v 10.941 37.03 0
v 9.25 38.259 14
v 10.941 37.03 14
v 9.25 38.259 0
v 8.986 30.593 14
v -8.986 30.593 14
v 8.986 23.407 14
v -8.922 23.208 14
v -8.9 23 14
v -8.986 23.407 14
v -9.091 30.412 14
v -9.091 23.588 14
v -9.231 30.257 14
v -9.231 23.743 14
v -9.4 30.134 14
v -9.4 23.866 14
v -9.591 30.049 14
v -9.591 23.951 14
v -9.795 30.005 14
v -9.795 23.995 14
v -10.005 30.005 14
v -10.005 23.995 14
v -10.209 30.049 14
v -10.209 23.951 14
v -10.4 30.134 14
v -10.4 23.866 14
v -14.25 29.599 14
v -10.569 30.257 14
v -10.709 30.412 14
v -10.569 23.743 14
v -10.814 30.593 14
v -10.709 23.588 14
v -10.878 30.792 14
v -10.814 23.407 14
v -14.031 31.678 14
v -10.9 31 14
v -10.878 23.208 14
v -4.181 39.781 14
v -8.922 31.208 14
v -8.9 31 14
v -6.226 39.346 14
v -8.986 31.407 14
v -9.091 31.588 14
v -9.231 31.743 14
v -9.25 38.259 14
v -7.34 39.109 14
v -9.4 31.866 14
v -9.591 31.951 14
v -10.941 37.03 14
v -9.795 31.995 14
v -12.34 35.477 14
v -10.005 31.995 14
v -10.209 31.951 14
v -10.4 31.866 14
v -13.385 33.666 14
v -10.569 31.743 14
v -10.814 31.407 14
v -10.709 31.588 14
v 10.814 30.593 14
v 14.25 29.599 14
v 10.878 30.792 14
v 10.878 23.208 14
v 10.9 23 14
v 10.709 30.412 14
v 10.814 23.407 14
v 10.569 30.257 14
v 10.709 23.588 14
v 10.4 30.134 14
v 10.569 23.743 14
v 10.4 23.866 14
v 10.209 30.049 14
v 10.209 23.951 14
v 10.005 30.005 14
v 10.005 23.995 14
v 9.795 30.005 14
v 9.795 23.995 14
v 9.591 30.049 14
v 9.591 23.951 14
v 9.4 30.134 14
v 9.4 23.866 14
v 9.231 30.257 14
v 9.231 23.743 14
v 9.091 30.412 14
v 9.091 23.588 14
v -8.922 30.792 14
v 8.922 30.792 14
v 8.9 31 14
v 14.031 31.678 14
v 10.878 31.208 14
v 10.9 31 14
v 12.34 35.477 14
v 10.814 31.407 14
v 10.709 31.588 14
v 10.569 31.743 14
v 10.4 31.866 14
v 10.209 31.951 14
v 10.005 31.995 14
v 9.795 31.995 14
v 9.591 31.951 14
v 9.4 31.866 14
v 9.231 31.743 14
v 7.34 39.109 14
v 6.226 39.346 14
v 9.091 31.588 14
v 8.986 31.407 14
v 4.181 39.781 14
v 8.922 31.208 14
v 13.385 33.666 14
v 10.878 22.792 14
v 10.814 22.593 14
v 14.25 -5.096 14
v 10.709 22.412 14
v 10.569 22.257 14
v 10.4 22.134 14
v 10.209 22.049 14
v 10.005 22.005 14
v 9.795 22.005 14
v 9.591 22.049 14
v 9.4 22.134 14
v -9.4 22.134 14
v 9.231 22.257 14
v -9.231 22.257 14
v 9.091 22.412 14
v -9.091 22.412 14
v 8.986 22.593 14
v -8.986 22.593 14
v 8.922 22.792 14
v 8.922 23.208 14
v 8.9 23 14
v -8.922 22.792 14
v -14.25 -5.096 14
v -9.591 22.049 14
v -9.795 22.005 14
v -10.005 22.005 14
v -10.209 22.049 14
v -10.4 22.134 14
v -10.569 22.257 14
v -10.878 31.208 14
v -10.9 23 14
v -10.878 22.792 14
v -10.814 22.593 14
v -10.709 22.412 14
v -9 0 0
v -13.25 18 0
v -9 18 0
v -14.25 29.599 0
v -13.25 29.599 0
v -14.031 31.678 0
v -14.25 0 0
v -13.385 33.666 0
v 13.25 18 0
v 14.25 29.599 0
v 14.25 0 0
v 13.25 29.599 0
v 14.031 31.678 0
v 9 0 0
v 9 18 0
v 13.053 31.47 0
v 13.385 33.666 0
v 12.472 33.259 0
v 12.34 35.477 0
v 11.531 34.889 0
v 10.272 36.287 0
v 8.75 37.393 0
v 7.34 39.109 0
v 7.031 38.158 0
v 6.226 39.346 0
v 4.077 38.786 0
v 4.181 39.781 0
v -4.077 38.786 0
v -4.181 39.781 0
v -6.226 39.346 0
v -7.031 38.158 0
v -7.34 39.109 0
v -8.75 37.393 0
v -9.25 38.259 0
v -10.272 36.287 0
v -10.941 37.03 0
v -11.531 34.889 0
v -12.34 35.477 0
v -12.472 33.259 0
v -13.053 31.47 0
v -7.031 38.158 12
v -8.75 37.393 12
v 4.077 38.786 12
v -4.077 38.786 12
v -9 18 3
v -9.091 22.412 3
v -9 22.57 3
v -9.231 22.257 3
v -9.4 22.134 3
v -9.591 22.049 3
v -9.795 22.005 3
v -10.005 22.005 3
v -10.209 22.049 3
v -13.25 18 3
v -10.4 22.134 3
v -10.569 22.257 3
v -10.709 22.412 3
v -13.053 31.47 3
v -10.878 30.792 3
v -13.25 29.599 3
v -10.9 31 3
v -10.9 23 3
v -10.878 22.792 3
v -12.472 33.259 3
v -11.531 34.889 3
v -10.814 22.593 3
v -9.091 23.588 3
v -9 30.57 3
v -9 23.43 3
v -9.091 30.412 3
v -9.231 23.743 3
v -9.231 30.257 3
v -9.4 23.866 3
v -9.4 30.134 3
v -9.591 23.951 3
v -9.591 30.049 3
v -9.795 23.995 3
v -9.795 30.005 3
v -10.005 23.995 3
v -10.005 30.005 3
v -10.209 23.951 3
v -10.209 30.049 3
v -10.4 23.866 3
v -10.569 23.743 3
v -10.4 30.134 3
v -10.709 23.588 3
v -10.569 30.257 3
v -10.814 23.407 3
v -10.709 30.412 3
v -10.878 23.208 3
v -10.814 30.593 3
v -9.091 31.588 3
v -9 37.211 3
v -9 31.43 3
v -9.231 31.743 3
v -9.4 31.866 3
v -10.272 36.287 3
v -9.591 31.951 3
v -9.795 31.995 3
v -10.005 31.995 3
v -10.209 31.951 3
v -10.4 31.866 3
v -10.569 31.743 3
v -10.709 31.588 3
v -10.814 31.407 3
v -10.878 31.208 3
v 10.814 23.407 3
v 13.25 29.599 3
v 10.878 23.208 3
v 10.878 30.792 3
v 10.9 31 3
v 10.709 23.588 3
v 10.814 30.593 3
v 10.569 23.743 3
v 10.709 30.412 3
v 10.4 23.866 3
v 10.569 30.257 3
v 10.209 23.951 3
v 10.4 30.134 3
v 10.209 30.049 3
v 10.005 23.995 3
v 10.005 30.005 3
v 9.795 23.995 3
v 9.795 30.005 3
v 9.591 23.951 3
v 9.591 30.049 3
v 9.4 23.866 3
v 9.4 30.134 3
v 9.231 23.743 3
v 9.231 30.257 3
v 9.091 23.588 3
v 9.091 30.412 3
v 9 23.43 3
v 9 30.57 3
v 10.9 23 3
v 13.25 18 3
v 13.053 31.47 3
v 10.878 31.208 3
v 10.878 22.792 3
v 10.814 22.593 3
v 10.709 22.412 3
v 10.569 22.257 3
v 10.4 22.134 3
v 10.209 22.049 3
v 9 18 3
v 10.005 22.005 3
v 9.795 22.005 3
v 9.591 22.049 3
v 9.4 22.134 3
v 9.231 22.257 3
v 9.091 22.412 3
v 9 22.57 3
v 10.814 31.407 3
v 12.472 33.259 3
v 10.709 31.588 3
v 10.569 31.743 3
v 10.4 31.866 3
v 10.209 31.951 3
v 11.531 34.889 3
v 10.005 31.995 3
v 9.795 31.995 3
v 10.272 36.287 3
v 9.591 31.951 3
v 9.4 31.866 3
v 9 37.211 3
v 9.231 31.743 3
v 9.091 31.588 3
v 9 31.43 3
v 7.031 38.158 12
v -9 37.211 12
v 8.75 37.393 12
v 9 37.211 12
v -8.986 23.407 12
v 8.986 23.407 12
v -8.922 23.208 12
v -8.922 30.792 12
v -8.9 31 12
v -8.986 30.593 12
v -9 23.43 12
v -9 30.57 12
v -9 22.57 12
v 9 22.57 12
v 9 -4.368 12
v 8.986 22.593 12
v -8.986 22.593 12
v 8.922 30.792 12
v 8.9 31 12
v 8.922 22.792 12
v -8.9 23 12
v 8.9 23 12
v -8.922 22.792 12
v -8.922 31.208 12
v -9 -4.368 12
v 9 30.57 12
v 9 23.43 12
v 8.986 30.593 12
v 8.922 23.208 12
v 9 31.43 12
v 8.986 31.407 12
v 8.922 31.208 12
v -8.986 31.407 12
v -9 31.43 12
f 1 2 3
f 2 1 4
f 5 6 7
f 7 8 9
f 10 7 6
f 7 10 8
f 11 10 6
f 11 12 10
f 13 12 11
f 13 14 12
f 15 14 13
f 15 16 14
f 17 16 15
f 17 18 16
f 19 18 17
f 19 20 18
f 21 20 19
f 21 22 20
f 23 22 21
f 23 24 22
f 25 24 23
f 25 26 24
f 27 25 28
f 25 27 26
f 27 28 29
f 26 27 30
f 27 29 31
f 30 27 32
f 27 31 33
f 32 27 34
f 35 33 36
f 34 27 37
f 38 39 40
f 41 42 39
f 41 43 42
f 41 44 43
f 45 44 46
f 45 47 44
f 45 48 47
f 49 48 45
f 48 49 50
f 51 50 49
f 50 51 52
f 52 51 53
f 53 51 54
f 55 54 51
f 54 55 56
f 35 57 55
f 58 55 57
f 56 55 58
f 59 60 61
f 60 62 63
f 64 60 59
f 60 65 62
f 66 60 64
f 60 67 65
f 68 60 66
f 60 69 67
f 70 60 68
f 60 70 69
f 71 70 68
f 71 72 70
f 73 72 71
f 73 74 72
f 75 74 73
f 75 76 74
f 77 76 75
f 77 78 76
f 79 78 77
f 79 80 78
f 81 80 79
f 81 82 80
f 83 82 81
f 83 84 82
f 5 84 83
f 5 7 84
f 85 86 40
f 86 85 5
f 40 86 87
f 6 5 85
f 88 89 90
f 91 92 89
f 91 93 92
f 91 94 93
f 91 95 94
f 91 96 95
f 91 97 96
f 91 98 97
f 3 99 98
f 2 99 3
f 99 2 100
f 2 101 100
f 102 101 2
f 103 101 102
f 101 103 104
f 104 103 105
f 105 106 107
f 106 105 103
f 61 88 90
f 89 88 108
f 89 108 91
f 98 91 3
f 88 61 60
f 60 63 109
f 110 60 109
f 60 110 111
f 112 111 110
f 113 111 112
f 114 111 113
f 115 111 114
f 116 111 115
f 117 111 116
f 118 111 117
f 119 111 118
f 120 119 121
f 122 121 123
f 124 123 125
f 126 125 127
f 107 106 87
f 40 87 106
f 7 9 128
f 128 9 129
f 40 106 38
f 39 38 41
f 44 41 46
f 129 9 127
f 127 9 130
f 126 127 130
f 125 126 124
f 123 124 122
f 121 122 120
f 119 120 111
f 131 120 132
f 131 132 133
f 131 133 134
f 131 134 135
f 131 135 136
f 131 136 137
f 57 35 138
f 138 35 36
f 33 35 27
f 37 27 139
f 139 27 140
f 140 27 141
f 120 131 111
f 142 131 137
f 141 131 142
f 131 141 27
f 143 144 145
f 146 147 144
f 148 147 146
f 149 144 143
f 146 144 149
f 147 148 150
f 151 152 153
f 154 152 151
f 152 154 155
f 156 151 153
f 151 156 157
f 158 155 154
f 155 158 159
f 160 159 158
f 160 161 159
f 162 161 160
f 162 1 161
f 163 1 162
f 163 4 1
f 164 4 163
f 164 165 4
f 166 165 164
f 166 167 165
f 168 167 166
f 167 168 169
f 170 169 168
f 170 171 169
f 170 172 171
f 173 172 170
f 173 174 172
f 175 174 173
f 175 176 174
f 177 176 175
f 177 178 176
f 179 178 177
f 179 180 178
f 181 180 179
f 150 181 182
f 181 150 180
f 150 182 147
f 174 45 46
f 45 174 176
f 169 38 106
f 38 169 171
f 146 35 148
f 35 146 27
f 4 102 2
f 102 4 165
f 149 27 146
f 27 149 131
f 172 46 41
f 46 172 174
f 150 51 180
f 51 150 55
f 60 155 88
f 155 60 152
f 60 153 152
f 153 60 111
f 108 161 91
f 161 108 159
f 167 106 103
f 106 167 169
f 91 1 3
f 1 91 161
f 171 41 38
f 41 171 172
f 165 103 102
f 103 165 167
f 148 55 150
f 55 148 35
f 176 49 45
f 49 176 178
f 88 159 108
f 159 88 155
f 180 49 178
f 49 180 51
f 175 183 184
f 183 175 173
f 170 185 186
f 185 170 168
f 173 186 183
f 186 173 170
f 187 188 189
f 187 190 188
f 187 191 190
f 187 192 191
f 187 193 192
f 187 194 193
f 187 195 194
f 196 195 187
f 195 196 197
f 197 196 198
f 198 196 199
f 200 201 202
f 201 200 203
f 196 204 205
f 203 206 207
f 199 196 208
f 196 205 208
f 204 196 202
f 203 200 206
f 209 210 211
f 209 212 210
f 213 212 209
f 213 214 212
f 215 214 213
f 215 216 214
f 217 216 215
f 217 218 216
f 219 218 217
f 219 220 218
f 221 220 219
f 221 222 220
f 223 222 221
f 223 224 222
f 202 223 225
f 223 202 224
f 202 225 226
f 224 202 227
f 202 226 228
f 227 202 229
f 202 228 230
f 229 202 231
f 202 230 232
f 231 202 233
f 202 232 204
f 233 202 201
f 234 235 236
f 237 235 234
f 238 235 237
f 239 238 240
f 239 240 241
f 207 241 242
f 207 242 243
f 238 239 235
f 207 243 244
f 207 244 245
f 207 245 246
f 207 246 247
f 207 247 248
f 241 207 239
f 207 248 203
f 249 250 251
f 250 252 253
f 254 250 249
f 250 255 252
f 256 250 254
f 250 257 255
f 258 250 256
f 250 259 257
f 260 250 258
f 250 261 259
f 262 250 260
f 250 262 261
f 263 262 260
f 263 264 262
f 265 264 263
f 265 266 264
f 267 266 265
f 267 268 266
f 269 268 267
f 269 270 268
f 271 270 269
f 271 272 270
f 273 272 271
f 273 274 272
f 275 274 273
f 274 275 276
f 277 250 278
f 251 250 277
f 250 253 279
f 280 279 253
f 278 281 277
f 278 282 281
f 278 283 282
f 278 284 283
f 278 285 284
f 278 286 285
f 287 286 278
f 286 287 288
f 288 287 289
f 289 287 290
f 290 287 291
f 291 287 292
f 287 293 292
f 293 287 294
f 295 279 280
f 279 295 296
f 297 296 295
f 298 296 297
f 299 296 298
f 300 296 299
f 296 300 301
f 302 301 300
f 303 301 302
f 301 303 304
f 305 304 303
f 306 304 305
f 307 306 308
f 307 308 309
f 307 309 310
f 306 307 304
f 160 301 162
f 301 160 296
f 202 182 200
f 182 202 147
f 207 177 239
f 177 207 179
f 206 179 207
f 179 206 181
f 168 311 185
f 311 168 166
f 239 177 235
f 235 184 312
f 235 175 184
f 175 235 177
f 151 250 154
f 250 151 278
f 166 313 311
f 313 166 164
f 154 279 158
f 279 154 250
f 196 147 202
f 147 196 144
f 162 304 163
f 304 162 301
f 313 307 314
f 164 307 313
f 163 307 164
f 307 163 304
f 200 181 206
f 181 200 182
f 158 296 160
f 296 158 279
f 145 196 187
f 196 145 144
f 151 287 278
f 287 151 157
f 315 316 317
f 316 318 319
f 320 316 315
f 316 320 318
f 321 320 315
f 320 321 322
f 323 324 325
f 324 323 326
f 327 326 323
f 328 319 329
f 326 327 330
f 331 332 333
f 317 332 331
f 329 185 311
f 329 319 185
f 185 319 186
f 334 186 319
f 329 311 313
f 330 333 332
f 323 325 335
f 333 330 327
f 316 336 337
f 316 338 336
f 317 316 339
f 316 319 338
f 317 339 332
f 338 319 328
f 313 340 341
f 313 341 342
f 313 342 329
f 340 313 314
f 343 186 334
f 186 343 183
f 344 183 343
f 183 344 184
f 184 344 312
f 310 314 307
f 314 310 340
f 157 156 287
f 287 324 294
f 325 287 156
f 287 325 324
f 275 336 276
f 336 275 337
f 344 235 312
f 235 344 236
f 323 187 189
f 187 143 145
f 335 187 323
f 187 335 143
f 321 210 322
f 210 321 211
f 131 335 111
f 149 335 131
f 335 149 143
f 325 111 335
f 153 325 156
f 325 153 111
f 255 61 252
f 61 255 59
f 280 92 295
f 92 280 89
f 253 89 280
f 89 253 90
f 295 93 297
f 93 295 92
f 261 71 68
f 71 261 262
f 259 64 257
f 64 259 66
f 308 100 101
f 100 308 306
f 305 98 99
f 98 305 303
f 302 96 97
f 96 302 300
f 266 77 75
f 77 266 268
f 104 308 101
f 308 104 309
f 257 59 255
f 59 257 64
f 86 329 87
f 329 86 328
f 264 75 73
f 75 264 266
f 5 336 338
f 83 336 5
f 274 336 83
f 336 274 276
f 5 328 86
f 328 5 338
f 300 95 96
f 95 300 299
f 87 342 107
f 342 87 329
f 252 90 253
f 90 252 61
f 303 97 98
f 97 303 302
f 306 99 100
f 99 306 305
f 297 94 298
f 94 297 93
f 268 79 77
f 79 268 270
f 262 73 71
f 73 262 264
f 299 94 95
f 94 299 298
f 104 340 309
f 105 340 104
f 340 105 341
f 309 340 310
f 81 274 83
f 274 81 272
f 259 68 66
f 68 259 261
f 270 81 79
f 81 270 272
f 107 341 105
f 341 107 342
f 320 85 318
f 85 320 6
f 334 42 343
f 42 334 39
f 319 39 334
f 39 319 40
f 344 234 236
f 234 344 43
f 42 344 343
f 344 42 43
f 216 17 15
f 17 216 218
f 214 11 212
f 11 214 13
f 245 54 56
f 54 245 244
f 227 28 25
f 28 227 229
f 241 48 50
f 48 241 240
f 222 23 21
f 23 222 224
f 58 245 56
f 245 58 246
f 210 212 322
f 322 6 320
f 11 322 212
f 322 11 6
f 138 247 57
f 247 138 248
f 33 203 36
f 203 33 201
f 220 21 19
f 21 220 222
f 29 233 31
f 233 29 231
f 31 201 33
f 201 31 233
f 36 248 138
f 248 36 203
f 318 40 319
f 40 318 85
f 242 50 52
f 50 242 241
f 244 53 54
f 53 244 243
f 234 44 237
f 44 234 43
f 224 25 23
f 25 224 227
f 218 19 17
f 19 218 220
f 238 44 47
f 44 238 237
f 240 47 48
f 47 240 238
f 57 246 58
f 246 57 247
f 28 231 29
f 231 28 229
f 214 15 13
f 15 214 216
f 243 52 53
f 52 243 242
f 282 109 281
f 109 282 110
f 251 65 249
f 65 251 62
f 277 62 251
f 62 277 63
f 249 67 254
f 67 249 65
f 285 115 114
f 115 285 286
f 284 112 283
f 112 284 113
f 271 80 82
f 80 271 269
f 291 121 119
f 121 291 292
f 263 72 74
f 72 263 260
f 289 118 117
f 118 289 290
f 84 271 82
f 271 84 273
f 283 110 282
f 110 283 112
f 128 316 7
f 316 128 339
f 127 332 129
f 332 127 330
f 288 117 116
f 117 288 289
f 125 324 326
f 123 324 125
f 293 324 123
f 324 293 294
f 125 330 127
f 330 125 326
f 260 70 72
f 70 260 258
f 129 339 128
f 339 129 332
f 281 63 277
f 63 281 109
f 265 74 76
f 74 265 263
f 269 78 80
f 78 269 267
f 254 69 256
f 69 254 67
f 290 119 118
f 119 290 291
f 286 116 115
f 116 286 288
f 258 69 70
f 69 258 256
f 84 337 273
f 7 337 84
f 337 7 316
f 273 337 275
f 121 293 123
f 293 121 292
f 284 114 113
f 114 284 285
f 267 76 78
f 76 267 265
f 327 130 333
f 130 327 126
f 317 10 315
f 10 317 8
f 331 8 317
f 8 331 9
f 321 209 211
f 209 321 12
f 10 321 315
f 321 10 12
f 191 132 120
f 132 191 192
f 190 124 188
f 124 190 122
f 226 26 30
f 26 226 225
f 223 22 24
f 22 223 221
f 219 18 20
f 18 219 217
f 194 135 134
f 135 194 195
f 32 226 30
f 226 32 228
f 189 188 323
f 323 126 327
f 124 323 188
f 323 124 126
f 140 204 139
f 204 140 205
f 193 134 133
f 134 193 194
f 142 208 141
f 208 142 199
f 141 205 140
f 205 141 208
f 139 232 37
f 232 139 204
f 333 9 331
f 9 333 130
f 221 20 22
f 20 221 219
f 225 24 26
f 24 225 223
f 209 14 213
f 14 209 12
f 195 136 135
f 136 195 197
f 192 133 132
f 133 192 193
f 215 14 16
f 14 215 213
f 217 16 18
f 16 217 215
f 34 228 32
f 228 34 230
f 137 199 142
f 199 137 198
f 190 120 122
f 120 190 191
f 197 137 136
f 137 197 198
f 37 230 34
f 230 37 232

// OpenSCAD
$fs=0.002;
difference() {

    union() {
        minkowski() {
            intersection() {
                cylinder(11, r=30);
                color("red", 1)
                    translate([-4.25,0,0])
                    cube([8.5,30, 11]);
            }
            cylinder(3, r=10);
        }
        translate([-14.25,-20,0])
            cube([28.5,20,14]);
    }

    intersection() {
        minkowski() {
            intersection() {
                cylinder(2, r=30);
                translate([-4.25,0,0])
                    cube([8.5,30, 2]);
            }
            cylinder(1, r=9);
        }
        translate([-25,18,0])
            cube([50,30, 3]);
    }

    intersection() {
        minkowski() {
            intersection() {
                cylinder(11, r=30);
                translate([-4.25,0,0])
                    cube([8.5,30, 11]);
            }
            cylinder(1, r=9);
        }
        translate([-9,-20,0])
            cube([18,120, 120]);
    }
    rotate([20,0,0]) {
        translate([-50,-100,0])
            cube([100,100,100]);
    }
    translate([19.8/2.0,31,0])
        cylinder(100, r=1);
    translate([-19.8/2.0,31,0])
        cylinder(100, r=1);
    translate([19.8/2.0,23,0])
        cylinder(100, r=1);
    translate([-19.8/2.0,23,0])
        cylinder(100, r=1);
}
